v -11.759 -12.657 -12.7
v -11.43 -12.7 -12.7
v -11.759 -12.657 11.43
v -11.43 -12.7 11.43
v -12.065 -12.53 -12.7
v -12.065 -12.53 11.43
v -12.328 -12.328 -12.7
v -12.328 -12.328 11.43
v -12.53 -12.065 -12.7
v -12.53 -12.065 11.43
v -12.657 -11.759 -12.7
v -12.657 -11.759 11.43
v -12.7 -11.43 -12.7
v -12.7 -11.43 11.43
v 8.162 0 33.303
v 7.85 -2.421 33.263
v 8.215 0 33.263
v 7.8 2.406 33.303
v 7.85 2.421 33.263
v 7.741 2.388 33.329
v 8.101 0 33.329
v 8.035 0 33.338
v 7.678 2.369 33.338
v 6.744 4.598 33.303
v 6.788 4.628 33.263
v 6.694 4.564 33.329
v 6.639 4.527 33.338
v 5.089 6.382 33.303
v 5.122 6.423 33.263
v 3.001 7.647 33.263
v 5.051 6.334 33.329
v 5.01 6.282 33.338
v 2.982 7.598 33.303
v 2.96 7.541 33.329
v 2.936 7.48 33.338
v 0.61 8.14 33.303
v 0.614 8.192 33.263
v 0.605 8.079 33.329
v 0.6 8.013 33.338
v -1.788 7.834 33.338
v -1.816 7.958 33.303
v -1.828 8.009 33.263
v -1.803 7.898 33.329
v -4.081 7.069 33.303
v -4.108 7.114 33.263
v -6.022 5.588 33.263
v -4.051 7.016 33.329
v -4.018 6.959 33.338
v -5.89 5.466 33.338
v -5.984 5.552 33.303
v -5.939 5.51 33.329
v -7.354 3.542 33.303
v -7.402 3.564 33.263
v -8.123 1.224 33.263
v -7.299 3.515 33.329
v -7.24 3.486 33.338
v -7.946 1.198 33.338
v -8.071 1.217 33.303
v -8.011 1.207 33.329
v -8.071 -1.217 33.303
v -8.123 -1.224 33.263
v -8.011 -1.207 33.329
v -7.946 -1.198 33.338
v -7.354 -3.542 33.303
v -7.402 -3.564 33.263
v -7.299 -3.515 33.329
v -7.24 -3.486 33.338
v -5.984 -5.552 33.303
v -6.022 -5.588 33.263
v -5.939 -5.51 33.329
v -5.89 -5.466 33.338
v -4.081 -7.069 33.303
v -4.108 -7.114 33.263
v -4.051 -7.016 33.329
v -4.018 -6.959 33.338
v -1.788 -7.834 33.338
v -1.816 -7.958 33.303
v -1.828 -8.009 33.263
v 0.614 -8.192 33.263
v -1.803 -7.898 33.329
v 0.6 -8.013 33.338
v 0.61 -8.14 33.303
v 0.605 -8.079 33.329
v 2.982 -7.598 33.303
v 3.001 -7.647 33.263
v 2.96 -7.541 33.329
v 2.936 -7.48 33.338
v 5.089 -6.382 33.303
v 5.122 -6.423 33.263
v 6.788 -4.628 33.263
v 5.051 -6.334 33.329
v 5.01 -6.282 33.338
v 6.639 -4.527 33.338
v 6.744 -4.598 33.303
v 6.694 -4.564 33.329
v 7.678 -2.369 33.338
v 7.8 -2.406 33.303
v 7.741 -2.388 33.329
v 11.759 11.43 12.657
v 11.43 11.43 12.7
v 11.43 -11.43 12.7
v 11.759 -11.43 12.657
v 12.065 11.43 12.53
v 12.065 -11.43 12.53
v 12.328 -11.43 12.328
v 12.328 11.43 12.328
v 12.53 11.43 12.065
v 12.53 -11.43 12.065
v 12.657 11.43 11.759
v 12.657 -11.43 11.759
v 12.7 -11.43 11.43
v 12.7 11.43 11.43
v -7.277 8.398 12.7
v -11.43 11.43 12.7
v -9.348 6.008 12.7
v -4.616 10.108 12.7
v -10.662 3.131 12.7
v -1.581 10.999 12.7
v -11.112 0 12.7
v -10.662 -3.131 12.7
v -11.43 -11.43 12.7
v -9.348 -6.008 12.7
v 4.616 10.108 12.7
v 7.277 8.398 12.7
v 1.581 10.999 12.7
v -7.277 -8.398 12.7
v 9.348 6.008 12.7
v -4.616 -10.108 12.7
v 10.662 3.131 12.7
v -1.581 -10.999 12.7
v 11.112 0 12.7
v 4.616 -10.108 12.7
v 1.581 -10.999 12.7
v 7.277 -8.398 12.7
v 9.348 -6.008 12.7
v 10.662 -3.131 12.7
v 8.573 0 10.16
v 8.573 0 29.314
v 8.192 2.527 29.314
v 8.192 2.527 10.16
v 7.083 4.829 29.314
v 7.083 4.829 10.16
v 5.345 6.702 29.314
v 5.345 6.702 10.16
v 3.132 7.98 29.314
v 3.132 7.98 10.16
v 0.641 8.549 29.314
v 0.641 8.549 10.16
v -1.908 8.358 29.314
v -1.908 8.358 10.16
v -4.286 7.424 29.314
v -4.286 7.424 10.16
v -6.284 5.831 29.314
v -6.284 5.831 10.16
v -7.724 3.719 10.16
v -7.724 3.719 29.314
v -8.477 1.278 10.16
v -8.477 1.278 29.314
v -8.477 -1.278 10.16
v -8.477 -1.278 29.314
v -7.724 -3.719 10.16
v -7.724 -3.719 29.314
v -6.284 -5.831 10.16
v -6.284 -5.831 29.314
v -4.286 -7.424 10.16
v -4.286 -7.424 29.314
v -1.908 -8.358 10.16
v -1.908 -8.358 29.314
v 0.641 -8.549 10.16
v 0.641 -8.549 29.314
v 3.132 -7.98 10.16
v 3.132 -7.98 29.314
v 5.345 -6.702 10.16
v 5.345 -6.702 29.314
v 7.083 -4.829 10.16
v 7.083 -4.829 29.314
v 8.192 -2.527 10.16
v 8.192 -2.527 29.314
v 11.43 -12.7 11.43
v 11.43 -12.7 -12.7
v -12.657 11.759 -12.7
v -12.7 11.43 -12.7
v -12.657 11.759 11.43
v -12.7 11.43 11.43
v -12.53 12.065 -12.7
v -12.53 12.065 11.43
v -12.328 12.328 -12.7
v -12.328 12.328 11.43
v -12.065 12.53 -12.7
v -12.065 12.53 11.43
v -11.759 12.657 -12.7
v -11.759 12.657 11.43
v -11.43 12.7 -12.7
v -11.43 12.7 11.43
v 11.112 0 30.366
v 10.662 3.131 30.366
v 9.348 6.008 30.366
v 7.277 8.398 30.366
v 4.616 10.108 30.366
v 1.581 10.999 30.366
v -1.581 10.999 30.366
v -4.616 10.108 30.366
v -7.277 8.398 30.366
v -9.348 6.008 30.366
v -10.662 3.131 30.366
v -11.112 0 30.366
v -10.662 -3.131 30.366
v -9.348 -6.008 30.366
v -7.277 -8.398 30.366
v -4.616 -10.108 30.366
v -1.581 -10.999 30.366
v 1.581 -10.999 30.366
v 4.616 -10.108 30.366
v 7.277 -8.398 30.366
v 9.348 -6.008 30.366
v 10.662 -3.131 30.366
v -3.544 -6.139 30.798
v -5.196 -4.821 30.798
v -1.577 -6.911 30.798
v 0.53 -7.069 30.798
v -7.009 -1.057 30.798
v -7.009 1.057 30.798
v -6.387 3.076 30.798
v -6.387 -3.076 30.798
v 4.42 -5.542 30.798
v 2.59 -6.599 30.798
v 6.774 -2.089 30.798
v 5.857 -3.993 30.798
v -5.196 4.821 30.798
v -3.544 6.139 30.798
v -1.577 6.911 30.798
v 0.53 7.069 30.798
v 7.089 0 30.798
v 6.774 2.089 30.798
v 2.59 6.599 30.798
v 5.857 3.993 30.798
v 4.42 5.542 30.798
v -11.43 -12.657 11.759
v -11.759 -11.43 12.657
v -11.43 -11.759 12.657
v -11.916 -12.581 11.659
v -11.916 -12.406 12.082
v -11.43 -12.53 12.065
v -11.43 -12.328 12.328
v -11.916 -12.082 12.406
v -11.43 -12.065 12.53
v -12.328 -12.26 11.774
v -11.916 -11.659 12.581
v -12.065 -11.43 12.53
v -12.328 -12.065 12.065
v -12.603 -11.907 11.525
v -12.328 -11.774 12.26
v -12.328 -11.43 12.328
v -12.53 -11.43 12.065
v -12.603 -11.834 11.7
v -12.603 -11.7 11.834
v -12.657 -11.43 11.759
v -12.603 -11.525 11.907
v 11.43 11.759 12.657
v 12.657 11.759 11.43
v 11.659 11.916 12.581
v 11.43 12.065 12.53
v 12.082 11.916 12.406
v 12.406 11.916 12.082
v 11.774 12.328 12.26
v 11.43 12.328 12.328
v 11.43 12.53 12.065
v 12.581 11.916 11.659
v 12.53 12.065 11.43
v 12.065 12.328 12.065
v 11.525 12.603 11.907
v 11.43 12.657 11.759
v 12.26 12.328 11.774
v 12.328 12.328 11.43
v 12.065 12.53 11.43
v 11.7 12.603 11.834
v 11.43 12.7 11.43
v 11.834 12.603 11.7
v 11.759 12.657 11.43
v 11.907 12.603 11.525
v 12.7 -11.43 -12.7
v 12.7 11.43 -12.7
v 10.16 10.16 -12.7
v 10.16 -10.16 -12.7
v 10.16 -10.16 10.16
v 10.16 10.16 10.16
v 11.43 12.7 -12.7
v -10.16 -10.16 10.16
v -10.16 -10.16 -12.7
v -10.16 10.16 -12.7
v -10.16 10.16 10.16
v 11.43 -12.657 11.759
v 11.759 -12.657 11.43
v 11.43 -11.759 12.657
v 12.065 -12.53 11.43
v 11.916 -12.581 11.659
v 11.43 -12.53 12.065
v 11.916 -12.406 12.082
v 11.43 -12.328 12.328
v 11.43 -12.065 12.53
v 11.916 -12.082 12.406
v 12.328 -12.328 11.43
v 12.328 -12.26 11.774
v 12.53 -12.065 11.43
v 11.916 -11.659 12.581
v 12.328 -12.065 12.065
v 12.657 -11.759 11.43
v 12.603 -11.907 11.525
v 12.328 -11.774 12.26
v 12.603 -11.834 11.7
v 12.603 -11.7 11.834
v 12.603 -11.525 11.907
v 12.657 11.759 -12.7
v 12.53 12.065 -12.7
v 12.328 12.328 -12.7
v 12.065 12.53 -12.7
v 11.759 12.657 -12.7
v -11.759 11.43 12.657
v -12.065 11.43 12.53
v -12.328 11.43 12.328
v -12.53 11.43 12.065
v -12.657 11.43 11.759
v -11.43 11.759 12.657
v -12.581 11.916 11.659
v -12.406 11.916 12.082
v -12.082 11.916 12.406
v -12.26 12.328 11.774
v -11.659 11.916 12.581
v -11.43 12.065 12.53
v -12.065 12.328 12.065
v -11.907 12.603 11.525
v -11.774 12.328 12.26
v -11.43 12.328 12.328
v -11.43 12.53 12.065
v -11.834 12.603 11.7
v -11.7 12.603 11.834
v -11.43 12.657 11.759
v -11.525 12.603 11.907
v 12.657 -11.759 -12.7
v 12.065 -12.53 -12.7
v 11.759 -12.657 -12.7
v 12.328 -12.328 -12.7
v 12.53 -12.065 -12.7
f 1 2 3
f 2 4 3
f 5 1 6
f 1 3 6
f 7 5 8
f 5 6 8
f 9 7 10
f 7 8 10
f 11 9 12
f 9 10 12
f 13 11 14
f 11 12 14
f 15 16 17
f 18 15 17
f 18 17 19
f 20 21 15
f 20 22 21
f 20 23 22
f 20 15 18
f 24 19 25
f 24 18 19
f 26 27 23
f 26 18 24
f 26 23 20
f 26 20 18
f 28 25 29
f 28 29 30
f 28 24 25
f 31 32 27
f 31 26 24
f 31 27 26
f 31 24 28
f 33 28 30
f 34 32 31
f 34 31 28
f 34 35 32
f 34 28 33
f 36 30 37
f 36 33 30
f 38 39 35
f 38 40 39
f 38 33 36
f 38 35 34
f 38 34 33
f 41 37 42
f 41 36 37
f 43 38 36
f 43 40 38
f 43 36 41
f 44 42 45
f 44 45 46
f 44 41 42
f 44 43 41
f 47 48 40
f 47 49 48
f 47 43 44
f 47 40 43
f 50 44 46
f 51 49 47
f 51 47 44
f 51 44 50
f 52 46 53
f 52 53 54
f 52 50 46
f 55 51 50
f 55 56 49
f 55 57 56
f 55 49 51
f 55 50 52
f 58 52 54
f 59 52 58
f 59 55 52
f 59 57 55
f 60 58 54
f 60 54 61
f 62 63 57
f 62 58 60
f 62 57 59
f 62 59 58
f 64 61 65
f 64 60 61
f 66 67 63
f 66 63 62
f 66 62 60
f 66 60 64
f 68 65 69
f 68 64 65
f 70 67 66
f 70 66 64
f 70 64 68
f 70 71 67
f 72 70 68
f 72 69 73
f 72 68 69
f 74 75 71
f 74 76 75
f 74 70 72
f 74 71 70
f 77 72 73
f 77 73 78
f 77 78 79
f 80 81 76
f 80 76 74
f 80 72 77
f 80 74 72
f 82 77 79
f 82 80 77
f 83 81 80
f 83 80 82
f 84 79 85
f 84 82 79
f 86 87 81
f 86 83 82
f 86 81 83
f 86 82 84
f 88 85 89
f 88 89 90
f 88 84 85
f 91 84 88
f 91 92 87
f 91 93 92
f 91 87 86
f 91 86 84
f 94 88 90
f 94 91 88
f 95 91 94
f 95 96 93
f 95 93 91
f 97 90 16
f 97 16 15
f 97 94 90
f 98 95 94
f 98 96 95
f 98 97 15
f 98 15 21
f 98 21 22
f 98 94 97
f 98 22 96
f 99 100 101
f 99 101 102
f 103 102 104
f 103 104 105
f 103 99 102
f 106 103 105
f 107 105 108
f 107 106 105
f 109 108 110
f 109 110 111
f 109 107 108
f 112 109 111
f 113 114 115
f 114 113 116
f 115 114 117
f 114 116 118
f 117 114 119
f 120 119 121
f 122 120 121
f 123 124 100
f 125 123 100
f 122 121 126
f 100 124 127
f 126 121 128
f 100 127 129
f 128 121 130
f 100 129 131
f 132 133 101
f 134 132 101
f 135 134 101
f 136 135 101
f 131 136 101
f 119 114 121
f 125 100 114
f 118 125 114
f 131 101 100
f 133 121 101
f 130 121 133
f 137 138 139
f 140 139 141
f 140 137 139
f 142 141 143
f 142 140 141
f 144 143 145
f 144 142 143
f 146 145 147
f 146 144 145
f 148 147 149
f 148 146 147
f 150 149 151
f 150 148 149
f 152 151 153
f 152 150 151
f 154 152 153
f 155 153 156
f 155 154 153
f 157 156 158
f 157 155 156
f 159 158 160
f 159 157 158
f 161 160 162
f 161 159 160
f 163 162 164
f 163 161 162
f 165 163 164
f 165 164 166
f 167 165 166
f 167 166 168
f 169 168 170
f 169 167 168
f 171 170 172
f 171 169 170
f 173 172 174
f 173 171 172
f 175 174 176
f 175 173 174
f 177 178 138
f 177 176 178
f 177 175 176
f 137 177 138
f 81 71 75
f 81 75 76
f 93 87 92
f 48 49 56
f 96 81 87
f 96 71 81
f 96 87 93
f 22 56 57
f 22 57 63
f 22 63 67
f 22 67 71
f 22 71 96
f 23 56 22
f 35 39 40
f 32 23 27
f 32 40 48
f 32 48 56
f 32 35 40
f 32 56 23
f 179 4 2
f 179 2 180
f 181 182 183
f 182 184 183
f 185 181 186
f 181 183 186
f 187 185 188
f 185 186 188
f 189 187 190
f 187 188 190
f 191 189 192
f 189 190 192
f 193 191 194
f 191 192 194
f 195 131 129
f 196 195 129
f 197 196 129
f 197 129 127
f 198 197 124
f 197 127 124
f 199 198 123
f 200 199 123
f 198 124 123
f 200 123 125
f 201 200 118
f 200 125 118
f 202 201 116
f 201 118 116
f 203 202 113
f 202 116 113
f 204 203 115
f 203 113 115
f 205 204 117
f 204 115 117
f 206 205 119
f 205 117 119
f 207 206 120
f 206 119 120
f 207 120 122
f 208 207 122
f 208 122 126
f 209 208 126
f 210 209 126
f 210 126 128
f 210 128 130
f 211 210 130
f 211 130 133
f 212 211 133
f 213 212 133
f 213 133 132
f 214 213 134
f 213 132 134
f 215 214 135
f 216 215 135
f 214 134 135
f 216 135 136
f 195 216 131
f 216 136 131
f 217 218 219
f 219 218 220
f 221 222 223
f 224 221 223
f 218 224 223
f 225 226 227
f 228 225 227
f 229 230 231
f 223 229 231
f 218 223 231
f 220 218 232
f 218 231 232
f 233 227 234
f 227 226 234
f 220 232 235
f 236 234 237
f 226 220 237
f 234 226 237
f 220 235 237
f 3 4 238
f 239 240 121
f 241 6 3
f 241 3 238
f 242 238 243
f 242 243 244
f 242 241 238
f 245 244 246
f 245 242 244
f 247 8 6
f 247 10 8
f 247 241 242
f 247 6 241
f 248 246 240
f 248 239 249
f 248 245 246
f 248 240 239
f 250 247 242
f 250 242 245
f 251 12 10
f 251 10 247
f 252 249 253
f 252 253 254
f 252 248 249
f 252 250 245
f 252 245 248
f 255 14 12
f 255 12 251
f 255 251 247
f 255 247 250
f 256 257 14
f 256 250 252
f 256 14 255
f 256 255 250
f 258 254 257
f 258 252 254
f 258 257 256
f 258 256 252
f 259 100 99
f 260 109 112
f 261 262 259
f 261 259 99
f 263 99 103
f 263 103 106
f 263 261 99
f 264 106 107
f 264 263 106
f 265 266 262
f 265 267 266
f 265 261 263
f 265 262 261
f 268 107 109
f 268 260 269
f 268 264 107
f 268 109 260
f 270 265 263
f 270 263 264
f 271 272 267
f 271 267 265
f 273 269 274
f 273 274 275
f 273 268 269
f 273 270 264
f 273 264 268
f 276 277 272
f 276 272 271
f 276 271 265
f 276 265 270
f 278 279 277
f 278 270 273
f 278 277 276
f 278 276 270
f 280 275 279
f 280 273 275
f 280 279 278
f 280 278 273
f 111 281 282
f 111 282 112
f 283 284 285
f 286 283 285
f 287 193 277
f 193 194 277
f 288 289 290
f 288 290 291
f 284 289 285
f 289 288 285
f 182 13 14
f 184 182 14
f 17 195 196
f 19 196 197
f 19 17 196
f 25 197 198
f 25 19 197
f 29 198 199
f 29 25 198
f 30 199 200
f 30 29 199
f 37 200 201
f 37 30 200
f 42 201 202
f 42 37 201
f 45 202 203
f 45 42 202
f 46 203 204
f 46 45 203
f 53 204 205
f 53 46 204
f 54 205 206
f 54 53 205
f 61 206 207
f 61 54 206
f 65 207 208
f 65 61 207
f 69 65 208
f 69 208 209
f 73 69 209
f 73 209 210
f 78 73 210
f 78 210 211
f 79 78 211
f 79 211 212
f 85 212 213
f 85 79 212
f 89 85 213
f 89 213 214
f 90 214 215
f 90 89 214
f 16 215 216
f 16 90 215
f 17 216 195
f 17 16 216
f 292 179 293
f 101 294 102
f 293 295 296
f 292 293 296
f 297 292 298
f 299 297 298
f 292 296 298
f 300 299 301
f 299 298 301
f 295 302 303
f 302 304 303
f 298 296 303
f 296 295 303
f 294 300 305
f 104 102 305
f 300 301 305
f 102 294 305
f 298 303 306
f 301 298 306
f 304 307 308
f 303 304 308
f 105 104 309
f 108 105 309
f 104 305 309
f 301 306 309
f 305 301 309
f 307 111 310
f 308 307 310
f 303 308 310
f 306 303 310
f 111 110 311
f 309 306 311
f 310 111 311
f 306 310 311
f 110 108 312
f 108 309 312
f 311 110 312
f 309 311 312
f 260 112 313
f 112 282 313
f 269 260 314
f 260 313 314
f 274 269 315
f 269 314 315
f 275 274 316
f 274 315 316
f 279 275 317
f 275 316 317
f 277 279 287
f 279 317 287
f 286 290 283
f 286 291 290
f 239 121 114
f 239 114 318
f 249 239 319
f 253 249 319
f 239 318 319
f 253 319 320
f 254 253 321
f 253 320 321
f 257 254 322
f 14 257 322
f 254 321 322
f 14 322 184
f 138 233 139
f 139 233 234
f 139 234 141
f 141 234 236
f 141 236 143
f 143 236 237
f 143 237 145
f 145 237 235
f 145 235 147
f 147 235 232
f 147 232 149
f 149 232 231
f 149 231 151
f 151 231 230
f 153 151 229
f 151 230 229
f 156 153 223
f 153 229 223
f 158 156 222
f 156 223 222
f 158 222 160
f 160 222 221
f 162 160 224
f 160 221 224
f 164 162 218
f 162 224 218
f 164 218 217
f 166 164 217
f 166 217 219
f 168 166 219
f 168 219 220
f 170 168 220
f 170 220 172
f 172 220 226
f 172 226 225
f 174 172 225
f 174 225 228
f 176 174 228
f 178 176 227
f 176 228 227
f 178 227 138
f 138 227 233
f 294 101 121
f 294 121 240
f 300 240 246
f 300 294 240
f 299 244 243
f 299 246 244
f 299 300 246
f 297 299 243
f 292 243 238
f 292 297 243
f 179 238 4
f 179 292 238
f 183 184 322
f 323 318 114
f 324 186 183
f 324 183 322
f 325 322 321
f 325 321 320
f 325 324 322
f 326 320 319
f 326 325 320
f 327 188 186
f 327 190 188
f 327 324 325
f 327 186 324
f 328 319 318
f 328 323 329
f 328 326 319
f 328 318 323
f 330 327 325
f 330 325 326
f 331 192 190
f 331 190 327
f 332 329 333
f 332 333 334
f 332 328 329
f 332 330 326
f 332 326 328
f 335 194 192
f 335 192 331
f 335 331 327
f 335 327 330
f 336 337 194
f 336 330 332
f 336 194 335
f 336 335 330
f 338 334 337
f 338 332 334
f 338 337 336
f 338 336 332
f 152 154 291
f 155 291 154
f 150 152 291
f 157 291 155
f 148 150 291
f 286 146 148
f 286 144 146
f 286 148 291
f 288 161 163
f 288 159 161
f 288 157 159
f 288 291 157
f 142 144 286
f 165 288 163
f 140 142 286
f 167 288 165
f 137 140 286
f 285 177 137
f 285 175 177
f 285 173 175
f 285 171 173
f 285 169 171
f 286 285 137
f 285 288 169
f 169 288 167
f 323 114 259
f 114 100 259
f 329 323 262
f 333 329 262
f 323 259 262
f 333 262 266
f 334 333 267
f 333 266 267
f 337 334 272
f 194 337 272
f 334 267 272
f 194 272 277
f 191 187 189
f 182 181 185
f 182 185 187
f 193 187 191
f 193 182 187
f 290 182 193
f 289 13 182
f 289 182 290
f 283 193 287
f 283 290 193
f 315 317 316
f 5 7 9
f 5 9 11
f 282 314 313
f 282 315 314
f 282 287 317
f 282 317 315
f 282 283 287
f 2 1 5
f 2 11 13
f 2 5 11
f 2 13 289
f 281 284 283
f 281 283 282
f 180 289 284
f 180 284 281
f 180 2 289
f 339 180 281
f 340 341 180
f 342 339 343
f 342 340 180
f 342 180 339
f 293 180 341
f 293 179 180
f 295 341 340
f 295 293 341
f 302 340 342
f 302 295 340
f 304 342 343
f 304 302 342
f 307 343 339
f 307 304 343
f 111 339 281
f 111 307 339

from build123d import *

# Parameters (mm, degrees)
F0_W     = 25.4
F0_H     = 25.4
F1_DEPTH = 12.7
F2_R     = 11.1125
F3_DEPTH = 20.6375
F4_SIZE  = 2.9718
F5_R     = 0.254
F6_R     = 1.27
F7_R     = 1.27
F8_R     = 1.27
F9_R     = 1.27
F10_T    = -2.54


with BuildPart() as f1:
    # F0 (on Front) → F1 (new body, symmetric)
    with BuildSketch(Plane.XZ):
        Rectangle(F0_W, F0_H)
    extrude(amount=F1_DEPTH, both=True)

    # F2 (on face) → F3 (join)
    with BuildSketch(Plane.XY.offset(12.7)):
        Circle(F2_R)
    extrude(amount=F3_DEPTH)

    # F4
    f4_edges = [f1.edges().sort_by_distance(p)[0] for p in [
        (-11.1125, 0, 33.3375),
    ]]
    chamfer(f4_edges, length=F4_SIZE)

    # F5
    f5_edges = [f1.edges().sort_by_distance(p)[0] for p in [
        (-8.1407, 0, 33.3375),
    ]]
    fillet(f5_edges, radius=F5_R)

    # F6
    f6_edges = [f1.edges().sort_by_distance(p)[0] for p in [
        (0, -12.7, 12.7),
    ]]
    fillet(f6_edges, radius=F6_R)

    # F7
    f7_edges = [f1.edges().sort_by_distance(p)[0] for p in [
        (12.7, 0.635, 12.7),
    ]]
    fillet(f7_edges, radius=F7_R)

    # F8
    f8_edges = [f1.edges().sort_by_distance(p)[0] for p in [
        (-12.7, 0.635, 12.7),
    ]]
    fillet(f8_edges, radius=F8_R)

    # F9
    f9_edges = [f1.edges().sort_by_distance(p)[0] for p in [
        (0, 12.7, 12.7),
    ]]
    fillet(f9_edges, radius=F9_R)

    # F10
    f10_openings = [f1.faces().sort_by_distance(p)[0] for p in [
        (0, 0, -12.7),
    ]]
    offset(amount=F10_T, openings=f10_openings, kind=Kind.INTERSECTION)


solid = f1.part
